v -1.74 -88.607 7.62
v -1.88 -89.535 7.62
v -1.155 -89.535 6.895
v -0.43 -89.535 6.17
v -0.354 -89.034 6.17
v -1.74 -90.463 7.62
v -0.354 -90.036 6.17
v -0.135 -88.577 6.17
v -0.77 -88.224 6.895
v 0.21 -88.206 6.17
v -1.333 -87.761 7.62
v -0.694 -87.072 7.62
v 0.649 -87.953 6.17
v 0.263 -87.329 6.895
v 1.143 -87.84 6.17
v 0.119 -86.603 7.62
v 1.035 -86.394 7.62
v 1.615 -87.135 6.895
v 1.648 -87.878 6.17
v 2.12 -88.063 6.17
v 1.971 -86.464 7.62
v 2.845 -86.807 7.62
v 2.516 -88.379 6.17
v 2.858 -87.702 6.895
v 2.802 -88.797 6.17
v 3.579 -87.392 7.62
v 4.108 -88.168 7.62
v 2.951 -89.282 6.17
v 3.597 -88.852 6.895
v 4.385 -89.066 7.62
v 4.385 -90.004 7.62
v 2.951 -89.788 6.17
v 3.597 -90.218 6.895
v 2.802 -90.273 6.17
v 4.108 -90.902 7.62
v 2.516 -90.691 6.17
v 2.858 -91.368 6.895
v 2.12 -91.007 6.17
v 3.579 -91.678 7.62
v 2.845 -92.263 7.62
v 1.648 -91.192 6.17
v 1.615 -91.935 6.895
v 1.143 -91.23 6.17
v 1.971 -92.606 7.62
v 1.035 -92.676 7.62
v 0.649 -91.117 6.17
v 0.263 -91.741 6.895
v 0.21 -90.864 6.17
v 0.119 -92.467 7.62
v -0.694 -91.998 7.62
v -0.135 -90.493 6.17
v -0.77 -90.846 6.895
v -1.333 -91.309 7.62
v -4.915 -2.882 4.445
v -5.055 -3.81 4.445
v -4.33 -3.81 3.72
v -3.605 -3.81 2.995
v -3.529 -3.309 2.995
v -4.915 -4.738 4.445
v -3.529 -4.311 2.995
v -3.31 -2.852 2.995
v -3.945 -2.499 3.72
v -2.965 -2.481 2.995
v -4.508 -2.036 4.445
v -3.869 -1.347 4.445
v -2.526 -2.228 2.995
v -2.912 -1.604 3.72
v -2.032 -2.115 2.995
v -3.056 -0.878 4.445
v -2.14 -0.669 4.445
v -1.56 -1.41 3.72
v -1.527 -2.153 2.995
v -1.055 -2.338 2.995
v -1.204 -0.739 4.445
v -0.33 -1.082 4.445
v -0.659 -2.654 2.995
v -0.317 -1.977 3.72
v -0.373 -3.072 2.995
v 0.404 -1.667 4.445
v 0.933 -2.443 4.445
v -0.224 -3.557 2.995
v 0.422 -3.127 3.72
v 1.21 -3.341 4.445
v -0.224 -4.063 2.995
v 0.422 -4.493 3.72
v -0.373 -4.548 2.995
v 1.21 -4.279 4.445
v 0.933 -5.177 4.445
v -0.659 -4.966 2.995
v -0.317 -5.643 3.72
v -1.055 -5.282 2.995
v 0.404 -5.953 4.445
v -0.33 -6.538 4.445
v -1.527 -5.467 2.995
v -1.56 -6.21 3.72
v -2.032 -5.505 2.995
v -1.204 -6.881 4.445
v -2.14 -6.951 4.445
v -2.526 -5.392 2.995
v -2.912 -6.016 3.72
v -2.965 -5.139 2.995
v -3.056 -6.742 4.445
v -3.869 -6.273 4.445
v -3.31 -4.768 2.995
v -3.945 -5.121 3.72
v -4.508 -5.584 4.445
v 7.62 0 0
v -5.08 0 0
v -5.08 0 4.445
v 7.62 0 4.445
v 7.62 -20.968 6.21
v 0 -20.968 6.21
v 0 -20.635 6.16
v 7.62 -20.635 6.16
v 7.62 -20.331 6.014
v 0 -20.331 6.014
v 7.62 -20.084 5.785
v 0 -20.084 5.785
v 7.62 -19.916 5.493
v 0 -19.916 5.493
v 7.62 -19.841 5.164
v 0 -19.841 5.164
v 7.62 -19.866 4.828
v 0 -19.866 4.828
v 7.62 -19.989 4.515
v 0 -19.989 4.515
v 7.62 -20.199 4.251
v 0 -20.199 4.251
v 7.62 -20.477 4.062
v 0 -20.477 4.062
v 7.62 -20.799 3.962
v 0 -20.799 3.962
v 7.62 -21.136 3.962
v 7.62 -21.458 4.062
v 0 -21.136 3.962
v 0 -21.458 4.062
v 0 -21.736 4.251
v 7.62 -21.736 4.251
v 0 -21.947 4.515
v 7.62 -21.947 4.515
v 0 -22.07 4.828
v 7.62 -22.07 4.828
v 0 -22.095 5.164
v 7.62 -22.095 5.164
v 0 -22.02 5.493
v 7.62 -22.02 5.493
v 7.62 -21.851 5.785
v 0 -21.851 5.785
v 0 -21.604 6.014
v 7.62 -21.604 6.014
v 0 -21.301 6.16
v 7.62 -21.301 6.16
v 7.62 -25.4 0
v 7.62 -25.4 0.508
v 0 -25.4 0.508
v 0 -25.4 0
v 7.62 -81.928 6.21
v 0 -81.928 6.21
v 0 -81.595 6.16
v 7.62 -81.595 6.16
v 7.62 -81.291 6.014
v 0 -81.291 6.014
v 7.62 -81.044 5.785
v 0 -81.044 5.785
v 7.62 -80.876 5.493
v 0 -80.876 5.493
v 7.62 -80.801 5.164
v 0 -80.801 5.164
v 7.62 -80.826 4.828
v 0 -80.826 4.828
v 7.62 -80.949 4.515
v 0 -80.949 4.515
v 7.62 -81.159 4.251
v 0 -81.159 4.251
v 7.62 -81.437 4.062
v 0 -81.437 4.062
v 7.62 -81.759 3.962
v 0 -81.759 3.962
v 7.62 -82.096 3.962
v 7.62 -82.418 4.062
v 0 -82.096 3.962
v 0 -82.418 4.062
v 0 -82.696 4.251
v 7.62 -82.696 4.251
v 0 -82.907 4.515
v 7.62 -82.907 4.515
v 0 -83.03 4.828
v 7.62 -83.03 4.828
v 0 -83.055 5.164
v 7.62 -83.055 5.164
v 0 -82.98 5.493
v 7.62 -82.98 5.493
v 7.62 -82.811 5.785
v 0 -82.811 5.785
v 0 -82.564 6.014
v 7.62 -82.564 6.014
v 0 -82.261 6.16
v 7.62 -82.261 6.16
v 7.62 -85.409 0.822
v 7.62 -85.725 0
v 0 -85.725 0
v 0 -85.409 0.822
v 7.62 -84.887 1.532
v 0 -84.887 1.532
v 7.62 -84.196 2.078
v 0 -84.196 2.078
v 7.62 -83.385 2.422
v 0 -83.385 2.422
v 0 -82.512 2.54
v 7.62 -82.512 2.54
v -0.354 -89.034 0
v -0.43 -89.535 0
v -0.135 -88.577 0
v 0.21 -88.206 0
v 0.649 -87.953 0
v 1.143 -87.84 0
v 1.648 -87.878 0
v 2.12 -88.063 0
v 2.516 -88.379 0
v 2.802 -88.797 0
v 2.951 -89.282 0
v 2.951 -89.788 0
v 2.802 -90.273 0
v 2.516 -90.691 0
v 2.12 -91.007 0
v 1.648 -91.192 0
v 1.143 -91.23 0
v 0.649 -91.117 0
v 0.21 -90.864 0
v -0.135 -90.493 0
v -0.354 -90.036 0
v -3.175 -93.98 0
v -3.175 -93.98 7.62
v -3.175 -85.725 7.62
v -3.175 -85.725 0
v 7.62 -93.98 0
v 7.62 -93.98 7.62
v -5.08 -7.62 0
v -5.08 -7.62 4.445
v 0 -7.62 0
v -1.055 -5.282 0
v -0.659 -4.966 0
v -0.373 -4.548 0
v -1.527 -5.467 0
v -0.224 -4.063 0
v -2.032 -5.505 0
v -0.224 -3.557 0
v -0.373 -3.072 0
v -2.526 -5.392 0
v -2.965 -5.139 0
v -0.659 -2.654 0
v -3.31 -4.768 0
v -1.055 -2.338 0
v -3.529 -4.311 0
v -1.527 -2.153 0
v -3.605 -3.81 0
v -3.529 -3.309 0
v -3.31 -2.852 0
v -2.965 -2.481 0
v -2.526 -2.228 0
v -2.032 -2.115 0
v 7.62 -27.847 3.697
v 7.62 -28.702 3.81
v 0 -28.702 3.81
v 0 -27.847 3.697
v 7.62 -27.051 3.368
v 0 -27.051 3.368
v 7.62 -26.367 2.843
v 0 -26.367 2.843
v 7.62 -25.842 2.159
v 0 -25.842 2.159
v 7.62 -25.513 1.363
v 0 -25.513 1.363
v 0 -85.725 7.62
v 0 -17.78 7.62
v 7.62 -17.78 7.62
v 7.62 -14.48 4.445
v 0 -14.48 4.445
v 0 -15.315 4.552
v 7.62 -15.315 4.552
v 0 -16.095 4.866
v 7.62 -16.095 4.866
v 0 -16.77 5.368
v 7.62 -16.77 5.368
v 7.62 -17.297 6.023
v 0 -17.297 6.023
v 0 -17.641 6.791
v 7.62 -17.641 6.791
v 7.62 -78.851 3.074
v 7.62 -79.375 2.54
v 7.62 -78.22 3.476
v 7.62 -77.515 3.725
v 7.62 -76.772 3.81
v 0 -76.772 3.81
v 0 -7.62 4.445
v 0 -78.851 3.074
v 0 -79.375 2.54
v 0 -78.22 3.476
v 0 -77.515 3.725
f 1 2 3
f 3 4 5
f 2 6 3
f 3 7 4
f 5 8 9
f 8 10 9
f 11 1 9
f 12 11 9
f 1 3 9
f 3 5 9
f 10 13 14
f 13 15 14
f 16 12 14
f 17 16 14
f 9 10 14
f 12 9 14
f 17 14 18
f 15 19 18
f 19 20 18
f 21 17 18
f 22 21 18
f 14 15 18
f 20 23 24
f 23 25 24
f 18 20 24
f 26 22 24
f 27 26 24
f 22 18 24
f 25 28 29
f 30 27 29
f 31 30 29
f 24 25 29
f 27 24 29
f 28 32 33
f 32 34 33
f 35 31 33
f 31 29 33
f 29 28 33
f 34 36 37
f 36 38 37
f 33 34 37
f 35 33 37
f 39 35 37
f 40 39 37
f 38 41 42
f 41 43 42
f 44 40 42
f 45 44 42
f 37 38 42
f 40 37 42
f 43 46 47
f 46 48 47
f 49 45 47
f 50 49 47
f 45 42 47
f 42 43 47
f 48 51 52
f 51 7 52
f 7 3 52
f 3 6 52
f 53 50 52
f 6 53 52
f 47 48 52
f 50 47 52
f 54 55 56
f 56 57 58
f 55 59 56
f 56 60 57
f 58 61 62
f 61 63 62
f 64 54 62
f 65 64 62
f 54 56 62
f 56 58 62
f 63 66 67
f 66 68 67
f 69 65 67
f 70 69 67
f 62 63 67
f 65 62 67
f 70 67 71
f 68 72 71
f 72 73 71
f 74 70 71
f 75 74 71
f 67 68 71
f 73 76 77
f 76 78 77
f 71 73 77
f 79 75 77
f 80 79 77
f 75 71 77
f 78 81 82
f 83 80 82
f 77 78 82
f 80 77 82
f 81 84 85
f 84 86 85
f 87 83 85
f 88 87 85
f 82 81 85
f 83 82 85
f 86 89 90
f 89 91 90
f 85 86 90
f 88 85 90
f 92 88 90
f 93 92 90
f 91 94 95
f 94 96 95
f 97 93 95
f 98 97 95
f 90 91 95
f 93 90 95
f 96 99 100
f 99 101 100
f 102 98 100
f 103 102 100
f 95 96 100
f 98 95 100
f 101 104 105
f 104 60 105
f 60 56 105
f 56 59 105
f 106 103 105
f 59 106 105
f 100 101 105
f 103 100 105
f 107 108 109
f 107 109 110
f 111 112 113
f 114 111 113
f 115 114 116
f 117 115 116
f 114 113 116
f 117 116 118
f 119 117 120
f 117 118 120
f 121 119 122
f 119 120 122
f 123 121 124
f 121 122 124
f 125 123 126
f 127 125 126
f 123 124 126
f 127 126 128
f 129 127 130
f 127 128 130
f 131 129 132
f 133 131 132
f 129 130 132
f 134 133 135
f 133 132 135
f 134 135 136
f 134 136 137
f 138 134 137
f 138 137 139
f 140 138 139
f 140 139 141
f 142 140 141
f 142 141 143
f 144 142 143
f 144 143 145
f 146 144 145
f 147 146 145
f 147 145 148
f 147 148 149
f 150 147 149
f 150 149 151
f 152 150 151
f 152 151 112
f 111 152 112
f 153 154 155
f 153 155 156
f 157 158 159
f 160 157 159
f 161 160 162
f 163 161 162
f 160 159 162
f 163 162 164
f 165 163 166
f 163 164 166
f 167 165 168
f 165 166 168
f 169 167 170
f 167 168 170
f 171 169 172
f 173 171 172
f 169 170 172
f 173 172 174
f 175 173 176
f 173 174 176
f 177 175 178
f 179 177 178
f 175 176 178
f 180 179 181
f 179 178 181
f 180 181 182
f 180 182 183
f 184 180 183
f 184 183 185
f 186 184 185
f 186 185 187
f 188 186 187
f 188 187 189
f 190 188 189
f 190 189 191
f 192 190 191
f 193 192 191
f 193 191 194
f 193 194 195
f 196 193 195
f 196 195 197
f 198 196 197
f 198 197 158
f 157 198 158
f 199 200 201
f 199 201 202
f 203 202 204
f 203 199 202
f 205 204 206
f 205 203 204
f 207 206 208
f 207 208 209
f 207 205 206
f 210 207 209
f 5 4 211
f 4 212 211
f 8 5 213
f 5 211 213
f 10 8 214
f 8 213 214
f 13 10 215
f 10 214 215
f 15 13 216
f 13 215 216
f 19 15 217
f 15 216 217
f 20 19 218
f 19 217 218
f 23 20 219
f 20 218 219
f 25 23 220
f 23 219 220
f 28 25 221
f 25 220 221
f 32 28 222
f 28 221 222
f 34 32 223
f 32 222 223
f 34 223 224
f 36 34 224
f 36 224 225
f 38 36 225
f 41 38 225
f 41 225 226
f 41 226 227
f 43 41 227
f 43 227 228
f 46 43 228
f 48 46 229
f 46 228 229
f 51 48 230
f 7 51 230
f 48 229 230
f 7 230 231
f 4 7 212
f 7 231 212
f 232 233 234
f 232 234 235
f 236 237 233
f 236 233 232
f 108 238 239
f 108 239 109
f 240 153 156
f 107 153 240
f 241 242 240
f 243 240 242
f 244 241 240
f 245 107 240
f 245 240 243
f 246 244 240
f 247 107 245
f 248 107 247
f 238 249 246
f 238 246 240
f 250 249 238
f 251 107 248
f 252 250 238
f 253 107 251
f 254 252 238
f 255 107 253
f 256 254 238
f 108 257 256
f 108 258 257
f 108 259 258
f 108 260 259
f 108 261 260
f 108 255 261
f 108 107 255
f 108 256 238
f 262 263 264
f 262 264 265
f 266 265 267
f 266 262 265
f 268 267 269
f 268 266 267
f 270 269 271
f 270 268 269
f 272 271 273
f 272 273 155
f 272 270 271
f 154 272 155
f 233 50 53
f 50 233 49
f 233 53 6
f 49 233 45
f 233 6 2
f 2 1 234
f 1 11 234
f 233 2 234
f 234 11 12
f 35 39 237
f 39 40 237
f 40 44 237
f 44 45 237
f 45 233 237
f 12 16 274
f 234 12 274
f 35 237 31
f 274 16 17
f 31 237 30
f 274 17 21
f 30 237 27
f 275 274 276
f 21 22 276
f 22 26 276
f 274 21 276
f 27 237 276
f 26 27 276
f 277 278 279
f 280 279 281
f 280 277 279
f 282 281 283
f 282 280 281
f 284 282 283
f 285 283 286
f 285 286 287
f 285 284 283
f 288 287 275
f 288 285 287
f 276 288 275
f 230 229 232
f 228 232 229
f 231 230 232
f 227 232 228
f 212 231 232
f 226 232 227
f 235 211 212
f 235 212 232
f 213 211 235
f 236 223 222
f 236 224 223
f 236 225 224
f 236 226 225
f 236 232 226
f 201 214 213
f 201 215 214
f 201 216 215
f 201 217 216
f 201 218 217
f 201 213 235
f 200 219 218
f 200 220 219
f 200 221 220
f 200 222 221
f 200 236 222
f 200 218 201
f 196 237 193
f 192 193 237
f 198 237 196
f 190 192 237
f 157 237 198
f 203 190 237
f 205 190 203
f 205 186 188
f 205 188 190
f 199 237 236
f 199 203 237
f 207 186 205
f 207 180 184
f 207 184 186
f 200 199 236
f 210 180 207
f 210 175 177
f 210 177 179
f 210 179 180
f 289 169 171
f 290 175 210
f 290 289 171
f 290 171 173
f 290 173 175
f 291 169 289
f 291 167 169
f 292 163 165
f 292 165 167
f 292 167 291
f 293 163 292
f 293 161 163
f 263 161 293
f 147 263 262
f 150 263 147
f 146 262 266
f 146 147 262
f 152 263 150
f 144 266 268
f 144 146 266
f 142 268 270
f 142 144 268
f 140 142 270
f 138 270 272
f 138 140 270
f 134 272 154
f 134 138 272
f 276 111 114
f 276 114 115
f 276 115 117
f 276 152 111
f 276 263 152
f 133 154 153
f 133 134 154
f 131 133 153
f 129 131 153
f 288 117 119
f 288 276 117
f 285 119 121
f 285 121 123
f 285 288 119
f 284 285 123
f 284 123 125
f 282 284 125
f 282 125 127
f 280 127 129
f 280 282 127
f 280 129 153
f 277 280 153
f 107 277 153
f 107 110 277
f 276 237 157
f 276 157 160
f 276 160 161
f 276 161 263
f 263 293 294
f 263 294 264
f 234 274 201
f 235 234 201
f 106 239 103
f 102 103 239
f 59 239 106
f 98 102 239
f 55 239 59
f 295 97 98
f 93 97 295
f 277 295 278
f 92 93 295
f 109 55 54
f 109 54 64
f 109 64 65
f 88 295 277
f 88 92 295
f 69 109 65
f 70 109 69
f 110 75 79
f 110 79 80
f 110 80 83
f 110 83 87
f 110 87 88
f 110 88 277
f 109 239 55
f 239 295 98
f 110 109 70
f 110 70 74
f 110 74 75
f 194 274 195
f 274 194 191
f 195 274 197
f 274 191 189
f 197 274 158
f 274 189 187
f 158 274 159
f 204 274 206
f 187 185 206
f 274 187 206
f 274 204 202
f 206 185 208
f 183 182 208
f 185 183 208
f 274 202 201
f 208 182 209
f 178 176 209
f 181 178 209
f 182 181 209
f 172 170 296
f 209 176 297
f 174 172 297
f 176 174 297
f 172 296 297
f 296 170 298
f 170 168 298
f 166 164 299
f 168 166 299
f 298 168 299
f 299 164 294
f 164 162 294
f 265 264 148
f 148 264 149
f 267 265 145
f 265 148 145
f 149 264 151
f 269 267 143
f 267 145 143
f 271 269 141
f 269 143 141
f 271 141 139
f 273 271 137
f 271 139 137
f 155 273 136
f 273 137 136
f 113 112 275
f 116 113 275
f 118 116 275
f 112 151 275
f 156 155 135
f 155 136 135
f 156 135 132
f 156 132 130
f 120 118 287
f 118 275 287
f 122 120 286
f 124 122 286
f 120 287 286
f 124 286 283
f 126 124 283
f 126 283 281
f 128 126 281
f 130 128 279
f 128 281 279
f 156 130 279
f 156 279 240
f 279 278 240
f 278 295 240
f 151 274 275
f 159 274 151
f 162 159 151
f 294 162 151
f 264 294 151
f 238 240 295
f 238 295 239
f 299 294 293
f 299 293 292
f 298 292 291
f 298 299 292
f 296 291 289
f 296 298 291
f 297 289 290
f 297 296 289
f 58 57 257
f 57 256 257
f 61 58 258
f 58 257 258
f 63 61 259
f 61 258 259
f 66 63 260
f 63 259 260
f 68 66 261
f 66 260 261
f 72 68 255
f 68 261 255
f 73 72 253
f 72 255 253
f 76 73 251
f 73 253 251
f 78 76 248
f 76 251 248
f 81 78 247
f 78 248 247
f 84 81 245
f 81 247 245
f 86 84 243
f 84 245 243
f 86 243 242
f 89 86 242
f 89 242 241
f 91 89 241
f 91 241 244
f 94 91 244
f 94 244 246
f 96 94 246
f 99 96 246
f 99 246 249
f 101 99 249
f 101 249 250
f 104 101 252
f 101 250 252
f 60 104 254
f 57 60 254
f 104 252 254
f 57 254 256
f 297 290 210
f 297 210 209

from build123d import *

# Parameters (mm, degrees)
BOSS_EXTRUDE1_DEPTH                             = 7.62
SKETCH11_W                                      = 17.78
SKETCH11_H                                      = 17.78
CUT_EXTRUDE1_DEPTH                              = 3.175
SKETCH12_W                                      = 3.81
SKETCH12_H                                      = 60.325
CUT_EXTRUDE2_DEPTH                              = 96.139869666
SKETCH14_W                                      = 7.62
SKETCH14_H                                      = 8.255
BOSS_EXTRUDE3_DEPTH                             = 3.175
SKETCH24_W                                      = 7.62
SKETCH24_H                                      = 6.35
BOSS_EXTRUDE4_DEPTH                             = 1.27
CSK_FOR_M3_FLAT_HEAD_MACHINE_SCREW2_D           = 3.4
CSK_FOR_M3_FLAT_HEAD_MACHINE_SCREW2_CSINK_D     = 6.3
CSK_FOR_M3_FLAT_HEAD_MACHINE_SCREW2_CSINK_ANGLE = 90
CSK_FOR_M3_FLAT_HEAD_MACHINE_SCREW3_D           = 3.4
CSK_FOR_M3_FLAT_HEAD_MACHINE_SCREW3_CSINK_D     = 6.3
CSK_FOR_M3_FLAT_HEAD_MACHINE_SCREW3_CSINK_ANGLE = 90
F_4_40_TAPPED_HOLE2_D                           = 2.2606
F_4_40_TAPPED_HOLE2_DEPTH                       = 8.8646
F_4_40_TAPPED_HOLE2_TIP                         = 0.679152758
SKETCH25_W                                      = 5.08
SKETCH25_H                                      = 93.98
CUT_EXTRUDE3_DEPTH                              = 96.139869666
FILLET1_R                                       = 3.302


with BuildPart() as part:
    # Sketch1 → Boss-Extrude1 (new body)
    with BuildSketch(Plane.XY):
        Polygon((0, -93.98), (0, -7.62), (-5.08, -7.62), (-5.08, 0), (12.7, 0), (12.7, -7.62), (7.62, -7.62), (7.62, -93.98), align=None)
    extrude(amount=BOSS_EXTRUDE1_DEPTH)

    # Sketch11 → Cut-Extrude1 (cut)
    with BuildSketch(Plane.XY.offset(7.62)):
        with Locations((3.81, -8.89)):
            Rectangle(SKETCH11_W, SKETCH11_H)
    extrude(amount=-CUT_EXTRUDE1_DEPTH, mode=Mode.SUBTRACT)

    # Sketch12 → Cut-Extrude2 (cut, through all)
    with BuildSketch(Plane(origin=(7.62, 0, 0), x_dir=(0, 0, -1), z_dir=(1, 0, 0))):
        with Locations((-1.905, -55.5625)):
            Rectangle(SKETCH12_W, SKETCH12_H)
    extrude(amount=-CUT_EXTRUDE2_DEPTH, mode=Mode.SUBTRACT)

    # Sketch14 → Boss-Extrude3 (add)
    with BuildSketch(Plane(origin=(7.62, 0, 0), x_dir=(0, 0, -1), z_dir=(1, 0, 0))):
        with Locations((-3.81, -89.8525)):
            Rectangle(SKETCH14_W, SKETCH14_H)
    boss_extrude3 = extrude(amount=BOSS_EXTRUDE3_DEPTH)

    # Mirror1: Boss-Extrude3 across plane
    add(boss_extrude3.mirror(Plane(origin=(3.81, 0, 0), x_dir=(0, 0, 1), z_dir=(1, 0, 0))))

    # Sketch24 → Boss-Extrude4 (add)
    with BuildSketch(Plane(origin=(0, 0, 3.81), x_dir=(-1, 0, 0), z_dir=(0, 0, -1))):
        with Locations((-3.81, -82.55)):
            Rectangle(SKETCH24_W, SKETCH24_H)
    extrude(amount=BOSS_EXTRUDE4_DEPTH)

    # CSK for M3 Flat Head Machine Screw2 (through all)
    with Locations(Plane.XY.offset(7.62)):
        with Locations((1.27, -89.535)):
            CounterSinkHole(CSK_FOR_M3_FLAT_HEAD_MACHINE_SCREW2_D / 2, CSK_FOR_M3_FLAT_HEAD_MACHINE_SCREW2_CSINK_D / 2, counter_sink_angle=CSK_FOR_M3_FLAT_HEAD_MACHINE_SCREW2_CSINK_ANGLE)

    # CSK for M3 Flat Head Machine Screw3 (through all)
    with Locations(Plane.XY.offset(4.445)):
        with Locations((-1.905, -3.81)):
            CounterSinkHole(CSK_FOR_M3_FLAT_HEAD_MACHINE_SCREW3_D / 2, CSK_FOR_M3_FLAT_HEAD_MACHINE_SCREW3_CSINK_D / 2, counter_sink_angle=CSK_FOR_M3_FLAT_HEAD_MACHINE_SCREW3_CSINK_ANGLE)

    # #4-40 Tapped Hole2
    with Locations(Plane(origin=(7.62, 0, 0), x_dir=(0, 0, -1), z_dir=(1, 0, 0))):
        with Locations((-5.08, -20.9677), (-5.08, -81.9277)):
            Hole(F_4_40_TAPPED_HOLE2_D / 2, depth=F_4_40_TAPPED_HOLE2_DEPTH)
            with Locations((0, 0, -(F_4_40_TAPPED_HOLE2_DEPTH + F_4_40_TAPPED_HOLE2_TIP / 2))):  # 118° drill point
                Cone(0, F_4_40_TAPPED_HOLE2_D / 2, F_4_40_TAPPED_HOLE2_TIP, mode=Mode.SUBTRACT)

    # Sketch25 → Cut-Extrude3 (cut, through all)
    with BuildSketch(Plane(origin=(0, 0, 0), x_dir=(-1, 0, 0), z_dir=(0, 0, -1))):
        with Locations((-10.16, -46.99)):
            Rectangle(SKETCH25_W, SKETCH25_H)
    extrude(amount=-CUT_EXTRUDE3_DEPTH, mode=Mode.SUBTRACT)

    # Fillet1
    # the kernel refuses this fillet: 3.302 mm, written as the material it adds along each edge
    with BuildSketch(Plane(origin=(7.62, -85.725, 2.54), x_dir=(0, 0, -1), z_dir=(-1, 0, 0))) as fillet1_piece_1:
        with BuildLine():
            CenterArc((3.302, -3.212874103), FILLET1_R, 103.342363797, 76.657636203)
            Line((0, -3.212874103), (-0.06604, -3.212874103))
            Line((-0.06604, -3.212874103), (-0.06604, 0))
            Line((-0.06604, 0), (0, 0.06604))
            ThreePointArc((0, 0.06604), (1.27, 0.06604), (2.52476, 0.064257482))
            Line((2.52476, 0.064257482), (2.54, 0))
        make_face()
    extrude(amount=7.62)
    with BuildSketch(Plane(origin=(0, -79.375, 3.81), x_dir=(0, 0, -1), z_dir=(1, 0, 0))) as fillet1_piece_2:
        with BuildLine():
            CenterArc((3.302, 2.602725495), FILLET1_R, 180, 52.020127555)
            Line((0, 2.602725495), (-0.06604, 2.602725495))
            Line((-0.06604, 2.602725495), (-0.06604, 0))
            Line((-0.06604, 0), (0, -0.06604))
            ThreePointArc((0, -0.06604), (0.635, -0.06604), (1.22936, -0.05205451))
            Line((1.22936, -0.05205451), (1.27, 0))
        make_face()
    extrude(amount=7.62)
    with BuildSketch(Plane(origin=(7.62, -25.4, 3.81), x_dir=(0, 0, -1), z_dir=(-1, 0, 0))) as fillet1_piece_3:
        with BuildLine():
            CenterArc((FILLET1_R, FILLET1_R), FILLET1_R, 180, 90)
            Line((0, FILLET1_R), (-FILLET1_R * 0.02, FILLET1_R))
            Line((-FILLET1_R * 0.02, FILLET1_R), (-FILLET1_R * 0.02, -FILLET1_R * 0.02))
            Line((-FILLET1_R * 0.02, -FILLET1_R * 0.02), (FILLET1_R, -FILLET1_R * 0.02))
            Line((FILLET1_R, -FILLET1_R * 0.02), (FILLET1_R, 0))
        make_face()
    extrude(amount=7.62)
    with BuildSketch(Plane(origin=(7.62, -17.78, 4.445), x_dir=(0, 0, 1), z_dir=(-1, 0, 0))) as fillet1_piece_4:
        with BuildLine():
            CenterArc((3.302, 3.299556788), FILLET1_R, 180, 87.795772496)
            Line((0, 3.299556788), (-0.06604, 3.299556788))
            Line((-0.06604, 3.299556788), (-0.06604, 0))
            Line((-0.06604, 0), (0, -0.06604))
            ThreePointArc((0, -0.06604), (1.5875, -0.06604), (3.17246, -0.065991136))
            Line((3.17246, -0.065991136), (3.175, 0))
        make_face()
    extrude(amount=7.62)


solid = part.part
